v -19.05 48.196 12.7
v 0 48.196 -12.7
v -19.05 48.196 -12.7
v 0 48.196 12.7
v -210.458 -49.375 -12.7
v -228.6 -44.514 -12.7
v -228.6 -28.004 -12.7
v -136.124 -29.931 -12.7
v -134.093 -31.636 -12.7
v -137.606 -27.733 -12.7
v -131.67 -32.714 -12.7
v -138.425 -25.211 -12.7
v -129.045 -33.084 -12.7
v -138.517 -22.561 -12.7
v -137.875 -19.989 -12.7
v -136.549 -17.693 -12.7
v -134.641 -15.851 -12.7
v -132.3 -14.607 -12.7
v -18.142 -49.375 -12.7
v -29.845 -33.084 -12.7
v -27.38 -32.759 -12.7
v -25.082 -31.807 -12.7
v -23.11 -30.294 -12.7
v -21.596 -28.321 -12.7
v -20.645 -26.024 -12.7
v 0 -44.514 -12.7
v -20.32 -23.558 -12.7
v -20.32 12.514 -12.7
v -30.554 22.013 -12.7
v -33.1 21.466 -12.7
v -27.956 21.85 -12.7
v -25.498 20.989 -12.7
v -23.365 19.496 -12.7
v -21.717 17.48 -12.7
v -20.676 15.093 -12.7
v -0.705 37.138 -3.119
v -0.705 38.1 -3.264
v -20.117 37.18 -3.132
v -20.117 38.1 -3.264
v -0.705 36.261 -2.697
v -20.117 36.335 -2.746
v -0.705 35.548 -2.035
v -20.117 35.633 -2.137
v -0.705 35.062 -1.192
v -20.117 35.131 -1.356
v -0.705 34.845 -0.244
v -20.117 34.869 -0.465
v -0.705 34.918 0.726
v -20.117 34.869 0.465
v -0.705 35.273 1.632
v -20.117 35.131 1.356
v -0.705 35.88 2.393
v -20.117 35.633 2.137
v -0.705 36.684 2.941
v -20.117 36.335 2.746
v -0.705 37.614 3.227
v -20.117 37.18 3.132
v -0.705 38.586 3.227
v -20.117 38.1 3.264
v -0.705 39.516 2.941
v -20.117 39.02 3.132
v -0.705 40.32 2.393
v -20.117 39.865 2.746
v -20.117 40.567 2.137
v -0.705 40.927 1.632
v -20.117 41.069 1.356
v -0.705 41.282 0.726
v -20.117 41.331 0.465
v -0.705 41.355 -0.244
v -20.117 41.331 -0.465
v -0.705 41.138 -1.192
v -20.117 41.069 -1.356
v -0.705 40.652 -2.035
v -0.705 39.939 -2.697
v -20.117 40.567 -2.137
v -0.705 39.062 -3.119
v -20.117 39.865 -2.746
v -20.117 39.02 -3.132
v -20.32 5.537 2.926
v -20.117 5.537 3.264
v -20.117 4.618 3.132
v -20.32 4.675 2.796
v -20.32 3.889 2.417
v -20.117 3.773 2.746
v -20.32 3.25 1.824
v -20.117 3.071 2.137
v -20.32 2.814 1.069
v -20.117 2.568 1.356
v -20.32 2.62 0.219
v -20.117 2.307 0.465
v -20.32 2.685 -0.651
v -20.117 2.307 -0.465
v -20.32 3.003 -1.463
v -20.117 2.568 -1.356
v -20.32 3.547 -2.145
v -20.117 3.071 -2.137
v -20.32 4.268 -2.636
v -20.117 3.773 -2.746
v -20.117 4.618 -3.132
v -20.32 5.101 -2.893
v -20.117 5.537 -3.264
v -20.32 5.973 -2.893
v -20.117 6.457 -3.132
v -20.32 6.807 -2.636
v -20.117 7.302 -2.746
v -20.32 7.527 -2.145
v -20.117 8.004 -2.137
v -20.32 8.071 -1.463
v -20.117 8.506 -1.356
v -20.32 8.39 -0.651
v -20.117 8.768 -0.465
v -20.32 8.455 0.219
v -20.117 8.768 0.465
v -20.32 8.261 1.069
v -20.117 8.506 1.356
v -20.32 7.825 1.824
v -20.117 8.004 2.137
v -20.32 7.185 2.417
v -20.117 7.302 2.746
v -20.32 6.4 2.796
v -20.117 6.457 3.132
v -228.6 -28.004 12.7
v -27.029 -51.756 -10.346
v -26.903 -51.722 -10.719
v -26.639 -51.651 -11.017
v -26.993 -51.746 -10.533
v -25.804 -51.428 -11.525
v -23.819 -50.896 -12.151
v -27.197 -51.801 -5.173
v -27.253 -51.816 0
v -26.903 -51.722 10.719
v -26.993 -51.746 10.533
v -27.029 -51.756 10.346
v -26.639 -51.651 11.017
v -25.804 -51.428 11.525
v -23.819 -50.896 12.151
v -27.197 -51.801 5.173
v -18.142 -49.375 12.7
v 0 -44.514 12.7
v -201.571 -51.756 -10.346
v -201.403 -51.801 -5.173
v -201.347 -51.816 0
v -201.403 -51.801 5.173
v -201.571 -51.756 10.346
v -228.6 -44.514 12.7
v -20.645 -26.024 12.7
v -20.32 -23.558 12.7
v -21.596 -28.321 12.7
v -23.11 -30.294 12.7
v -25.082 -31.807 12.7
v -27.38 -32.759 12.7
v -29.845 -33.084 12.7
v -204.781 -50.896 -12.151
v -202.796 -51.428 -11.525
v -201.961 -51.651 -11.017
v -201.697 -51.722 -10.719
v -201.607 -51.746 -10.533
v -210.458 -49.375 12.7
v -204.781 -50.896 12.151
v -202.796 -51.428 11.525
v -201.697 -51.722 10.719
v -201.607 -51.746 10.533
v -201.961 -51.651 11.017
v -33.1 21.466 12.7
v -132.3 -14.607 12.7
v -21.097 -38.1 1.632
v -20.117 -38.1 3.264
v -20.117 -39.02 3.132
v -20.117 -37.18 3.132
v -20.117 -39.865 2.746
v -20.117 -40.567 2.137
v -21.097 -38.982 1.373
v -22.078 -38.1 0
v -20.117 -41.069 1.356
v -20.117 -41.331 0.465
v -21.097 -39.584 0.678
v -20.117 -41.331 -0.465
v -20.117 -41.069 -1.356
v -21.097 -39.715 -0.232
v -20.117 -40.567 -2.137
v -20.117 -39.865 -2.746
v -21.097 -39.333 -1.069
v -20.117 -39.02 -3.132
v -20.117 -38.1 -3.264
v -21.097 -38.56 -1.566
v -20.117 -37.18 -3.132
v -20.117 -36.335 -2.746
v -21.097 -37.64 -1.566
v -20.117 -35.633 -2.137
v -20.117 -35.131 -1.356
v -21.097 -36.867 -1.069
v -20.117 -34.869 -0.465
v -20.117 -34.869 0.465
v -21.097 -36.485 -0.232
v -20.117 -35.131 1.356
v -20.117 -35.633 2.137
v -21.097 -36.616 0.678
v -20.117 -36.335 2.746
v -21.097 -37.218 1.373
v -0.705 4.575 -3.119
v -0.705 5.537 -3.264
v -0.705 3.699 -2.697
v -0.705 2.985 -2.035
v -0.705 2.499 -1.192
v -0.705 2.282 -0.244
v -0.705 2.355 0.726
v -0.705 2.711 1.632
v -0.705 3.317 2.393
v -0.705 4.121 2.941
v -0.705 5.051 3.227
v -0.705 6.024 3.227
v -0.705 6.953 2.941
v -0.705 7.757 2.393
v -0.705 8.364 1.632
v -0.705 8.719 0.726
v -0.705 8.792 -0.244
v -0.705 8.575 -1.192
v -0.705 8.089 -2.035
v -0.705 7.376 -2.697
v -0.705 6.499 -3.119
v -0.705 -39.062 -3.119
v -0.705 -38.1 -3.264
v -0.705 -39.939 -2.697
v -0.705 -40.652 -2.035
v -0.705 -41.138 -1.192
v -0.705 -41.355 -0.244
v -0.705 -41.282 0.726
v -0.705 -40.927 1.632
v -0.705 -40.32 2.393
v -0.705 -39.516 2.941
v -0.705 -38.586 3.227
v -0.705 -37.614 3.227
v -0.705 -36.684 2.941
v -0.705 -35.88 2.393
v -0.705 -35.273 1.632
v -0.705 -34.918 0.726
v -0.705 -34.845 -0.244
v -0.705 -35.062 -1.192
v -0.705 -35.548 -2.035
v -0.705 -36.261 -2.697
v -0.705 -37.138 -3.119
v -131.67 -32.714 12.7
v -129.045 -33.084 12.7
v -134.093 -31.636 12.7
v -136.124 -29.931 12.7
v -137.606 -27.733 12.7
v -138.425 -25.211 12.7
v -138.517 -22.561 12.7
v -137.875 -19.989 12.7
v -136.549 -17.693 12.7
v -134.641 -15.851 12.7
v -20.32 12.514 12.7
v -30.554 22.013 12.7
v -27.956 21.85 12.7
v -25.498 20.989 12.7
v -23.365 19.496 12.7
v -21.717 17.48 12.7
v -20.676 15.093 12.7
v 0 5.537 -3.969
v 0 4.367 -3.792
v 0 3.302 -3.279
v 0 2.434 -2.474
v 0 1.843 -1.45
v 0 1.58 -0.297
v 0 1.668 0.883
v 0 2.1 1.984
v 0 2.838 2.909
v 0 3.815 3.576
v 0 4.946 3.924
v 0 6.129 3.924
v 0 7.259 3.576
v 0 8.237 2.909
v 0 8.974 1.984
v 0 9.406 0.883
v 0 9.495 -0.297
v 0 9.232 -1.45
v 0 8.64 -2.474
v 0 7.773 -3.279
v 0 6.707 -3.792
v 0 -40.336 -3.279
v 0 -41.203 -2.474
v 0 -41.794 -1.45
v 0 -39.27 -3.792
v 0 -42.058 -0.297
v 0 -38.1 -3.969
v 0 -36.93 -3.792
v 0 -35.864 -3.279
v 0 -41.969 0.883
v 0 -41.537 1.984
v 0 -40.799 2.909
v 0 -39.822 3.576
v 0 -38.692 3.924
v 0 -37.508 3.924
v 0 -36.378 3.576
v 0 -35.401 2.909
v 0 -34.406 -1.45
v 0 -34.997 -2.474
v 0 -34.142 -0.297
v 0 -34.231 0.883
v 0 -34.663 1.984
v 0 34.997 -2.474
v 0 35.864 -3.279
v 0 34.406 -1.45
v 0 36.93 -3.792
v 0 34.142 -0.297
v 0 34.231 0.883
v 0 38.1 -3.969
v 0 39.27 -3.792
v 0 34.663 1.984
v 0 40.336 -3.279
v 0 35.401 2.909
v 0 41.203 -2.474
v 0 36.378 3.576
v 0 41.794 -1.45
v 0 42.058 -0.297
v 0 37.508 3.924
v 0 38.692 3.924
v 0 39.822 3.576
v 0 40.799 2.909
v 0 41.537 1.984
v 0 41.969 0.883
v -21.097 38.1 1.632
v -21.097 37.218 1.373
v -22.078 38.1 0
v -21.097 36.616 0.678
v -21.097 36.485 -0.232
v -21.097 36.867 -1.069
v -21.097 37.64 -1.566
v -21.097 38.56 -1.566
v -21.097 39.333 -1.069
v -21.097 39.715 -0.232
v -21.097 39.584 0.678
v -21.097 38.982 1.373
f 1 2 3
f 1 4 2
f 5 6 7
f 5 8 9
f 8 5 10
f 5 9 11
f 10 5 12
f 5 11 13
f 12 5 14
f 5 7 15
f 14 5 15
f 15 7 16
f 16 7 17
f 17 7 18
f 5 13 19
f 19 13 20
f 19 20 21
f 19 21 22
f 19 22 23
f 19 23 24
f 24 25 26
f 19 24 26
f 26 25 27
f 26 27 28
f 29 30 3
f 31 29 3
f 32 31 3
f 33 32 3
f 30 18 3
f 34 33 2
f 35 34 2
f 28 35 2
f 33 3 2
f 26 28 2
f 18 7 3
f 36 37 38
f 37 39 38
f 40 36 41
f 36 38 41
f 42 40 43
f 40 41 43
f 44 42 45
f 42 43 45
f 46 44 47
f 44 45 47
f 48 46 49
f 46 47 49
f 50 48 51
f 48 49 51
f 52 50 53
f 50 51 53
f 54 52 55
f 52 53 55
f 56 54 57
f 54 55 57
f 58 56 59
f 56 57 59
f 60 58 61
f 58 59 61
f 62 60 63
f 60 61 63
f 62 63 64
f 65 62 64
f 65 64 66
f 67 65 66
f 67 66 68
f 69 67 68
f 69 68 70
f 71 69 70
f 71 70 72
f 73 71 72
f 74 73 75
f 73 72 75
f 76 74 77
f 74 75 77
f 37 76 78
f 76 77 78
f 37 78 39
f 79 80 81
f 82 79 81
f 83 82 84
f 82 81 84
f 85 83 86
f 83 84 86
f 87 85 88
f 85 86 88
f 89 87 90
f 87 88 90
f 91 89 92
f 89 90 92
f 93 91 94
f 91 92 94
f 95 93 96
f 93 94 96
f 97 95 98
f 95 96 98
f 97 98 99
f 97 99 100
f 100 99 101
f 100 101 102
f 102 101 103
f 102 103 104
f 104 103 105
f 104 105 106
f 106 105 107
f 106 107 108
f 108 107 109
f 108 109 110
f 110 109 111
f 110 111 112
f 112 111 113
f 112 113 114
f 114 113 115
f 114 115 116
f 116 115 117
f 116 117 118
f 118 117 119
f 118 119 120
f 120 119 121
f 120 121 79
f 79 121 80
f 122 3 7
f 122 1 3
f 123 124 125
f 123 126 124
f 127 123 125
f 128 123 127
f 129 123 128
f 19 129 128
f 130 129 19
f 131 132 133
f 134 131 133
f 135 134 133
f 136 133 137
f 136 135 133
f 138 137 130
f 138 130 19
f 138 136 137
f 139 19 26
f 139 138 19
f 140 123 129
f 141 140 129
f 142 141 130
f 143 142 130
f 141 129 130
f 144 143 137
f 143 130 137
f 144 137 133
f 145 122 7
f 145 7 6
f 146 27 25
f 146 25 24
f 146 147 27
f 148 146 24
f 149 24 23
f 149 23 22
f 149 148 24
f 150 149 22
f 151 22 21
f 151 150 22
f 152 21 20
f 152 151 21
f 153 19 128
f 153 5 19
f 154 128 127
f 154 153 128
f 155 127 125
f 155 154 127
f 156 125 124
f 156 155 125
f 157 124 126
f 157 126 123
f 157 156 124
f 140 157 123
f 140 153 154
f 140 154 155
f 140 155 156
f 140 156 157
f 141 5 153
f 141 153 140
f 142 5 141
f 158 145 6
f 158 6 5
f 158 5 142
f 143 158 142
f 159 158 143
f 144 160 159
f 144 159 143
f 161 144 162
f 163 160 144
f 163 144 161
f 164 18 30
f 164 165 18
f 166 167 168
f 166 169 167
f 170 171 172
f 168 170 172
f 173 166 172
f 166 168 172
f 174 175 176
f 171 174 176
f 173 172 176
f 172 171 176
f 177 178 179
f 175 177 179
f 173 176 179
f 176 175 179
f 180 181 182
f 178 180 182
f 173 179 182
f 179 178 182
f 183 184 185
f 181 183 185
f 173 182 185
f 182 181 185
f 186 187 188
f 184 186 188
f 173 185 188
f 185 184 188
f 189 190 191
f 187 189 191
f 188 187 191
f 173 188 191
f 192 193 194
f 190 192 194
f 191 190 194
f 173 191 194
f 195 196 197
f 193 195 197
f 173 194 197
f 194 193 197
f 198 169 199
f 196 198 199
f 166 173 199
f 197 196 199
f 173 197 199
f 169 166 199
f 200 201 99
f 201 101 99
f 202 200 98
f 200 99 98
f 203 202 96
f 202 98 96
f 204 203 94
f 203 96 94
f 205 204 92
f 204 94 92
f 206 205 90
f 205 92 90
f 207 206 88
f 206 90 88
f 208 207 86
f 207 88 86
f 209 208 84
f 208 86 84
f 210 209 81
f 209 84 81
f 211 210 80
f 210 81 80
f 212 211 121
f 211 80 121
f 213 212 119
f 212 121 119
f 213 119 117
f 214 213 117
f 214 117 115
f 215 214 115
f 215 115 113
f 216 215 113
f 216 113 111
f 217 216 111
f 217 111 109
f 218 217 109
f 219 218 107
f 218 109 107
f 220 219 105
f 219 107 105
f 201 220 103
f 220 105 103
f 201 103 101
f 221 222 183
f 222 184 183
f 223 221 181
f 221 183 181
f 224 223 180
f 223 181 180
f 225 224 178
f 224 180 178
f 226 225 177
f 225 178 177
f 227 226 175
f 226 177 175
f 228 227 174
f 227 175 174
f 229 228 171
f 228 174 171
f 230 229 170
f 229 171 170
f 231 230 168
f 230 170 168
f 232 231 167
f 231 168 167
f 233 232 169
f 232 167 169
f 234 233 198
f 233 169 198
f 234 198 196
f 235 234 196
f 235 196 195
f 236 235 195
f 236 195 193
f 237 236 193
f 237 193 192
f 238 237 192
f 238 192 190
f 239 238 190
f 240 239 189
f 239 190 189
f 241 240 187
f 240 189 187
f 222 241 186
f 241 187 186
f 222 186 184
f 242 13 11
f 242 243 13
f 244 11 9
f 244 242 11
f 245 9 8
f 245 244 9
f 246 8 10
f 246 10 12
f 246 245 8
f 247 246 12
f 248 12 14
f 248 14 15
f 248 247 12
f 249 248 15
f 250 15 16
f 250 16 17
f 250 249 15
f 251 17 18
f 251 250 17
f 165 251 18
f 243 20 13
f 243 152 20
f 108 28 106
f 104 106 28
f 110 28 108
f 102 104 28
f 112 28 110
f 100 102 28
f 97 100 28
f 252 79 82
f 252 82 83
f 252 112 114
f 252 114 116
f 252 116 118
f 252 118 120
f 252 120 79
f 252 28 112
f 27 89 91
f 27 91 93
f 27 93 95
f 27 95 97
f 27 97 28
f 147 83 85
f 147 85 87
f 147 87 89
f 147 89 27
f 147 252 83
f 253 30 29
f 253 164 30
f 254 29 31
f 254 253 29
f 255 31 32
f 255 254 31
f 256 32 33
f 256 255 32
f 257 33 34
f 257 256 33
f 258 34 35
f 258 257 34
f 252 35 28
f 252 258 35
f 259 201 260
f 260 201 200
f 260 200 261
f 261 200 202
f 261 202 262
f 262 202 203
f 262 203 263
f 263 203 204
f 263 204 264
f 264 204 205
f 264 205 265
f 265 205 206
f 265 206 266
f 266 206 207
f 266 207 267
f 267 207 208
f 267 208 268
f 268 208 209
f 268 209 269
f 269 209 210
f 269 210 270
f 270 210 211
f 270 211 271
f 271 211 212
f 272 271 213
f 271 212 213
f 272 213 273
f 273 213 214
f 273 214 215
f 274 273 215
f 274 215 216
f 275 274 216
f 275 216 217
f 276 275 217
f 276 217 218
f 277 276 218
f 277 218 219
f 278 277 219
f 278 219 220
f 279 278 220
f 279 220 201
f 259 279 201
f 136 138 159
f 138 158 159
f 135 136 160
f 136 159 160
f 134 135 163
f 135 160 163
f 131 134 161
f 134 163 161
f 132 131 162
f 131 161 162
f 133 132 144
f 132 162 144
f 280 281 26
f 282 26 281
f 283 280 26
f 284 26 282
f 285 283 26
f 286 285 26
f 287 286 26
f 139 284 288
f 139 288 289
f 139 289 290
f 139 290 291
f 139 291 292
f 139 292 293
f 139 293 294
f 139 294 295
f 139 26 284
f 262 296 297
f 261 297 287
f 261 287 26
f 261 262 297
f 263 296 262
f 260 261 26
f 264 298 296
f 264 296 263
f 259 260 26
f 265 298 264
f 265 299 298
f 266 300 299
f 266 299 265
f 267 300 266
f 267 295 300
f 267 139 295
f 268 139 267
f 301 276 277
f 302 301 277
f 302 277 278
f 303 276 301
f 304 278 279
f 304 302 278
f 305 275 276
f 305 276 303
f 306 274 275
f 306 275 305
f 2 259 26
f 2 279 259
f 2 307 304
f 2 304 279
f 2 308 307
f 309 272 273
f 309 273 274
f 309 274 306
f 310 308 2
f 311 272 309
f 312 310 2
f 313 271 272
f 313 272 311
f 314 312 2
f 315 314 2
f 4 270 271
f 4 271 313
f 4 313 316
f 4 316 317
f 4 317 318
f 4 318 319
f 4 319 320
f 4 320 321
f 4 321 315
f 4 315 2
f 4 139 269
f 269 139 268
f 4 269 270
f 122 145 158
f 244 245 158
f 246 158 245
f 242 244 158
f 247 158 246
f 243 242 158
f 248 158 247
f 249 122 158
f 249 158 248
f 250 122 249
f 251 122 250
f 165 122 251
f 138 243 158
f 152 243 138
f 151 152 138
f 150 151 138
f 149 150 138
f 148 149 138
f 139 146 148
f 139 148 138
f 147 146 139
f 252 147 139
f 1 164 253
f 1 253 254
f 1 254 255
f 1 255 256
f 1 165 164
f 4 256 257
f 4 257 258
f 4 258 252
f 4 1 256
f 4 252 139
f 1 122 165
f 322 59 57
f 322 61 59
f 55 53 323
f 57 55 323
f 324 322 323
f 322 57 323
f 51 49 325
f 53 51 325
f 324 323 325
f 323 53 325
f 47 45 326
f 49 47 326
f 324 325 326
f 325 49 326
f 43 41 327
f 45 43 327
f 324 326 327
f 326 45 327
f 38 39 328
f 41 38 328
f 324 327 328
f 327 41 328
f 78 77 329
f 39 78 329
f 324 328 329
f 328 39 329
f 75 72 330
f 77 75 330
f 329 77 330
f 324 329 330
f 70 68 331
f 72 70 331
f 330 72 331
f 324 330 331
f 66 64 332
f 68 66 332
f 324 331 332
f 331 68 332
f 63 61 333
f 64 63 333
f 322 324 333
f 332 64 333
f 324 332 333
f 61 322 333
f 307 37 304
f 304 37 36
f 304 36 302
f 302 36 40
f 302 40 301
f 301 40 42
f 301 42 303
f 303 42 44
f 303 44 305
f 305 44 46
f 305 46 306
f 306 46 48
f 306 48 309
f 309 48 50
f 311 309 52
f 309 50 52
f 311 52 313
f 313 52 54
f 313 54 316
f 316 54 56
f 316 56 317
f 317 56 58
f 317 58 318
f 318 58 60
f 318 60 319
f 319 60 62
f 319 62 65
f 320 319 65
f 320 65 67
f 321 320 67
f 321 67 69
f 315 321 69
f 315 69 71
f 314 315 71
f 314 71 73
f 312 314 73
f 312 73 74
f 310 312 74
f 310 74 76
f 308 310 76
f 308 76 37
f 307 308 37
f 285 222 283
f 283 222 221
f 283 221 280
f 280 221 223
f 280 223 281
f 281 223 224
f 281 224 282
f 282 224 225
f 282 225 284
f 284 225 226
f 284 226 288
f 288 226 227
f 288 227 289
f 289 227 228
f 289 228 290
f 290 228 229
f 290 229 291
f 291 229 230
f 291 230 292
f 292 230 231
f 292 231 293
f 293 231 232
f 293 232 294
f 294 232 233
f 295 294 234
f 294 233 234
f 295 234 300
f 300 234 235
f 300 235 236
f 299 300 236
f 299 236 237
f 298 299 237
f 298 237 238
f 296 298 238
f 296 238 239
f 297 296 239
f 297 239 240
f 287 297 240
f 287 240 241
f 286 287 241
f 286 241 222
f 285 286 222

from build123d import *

# Parameters (mm, degrees)
BOSS_EXTRUDE1_DEPTH                = 12.7
F_5_16_18_TAPPED_HOLE1_D           = 6.5278
F_5_16_18_TAPPED_HOLE1_DEPTH       = 20.1168
F_5_16_18_TAPPED_HOLE1_CSINK_D     = 7.9375
F_5_16_18_TAPPED_HOLE1_CSINK_ANGLE = 90
F_5_16_18_TAPPED_HOLE1_TIP         = 1.961148974
SKETCH8_OUTSIDE_W                  = 77.69
SKETCH8_OUTSIDE_H                  = 153.891
CUT_EXTRUDE1_DEPTH                 = 229.6
FILLET1_R                          = 2.38125


with BuildPart() as part:
    # Sketch1 w/mock PCB → Boss-Extrude1 (new body, symmetric)
    with BuildSketch(Plane.XY):
        Polygon((-19.05, 48.1965), (-228.6, -28.0035), (-228.6, -44.5135), (-195.422068321, -53.4035), (-33.177931679, -53.4035), (0, -44.5135), (0, 48.1965), align=None)
        with BuildLine():
            Line((-20.32, 12.51406647), (-20.32, -23.5585))
            ThreePointArc((-20.32, -23.5585), (-23.109807909, -30.293692091), (-29.845, -33.0835))
            Line((-29.845, -33.0835), (-129.044557791, -33.0835))
            ThreePointArc((-129.044557791, -33.0835), (-138.425095375, -25.211115999), (-132.299660467, -14.606967641))
            Line((-132.299660467, -14.606967641), (-33.100102676, 21.465598828))
            ThreePointArc((-33.100102676, 21.465598828), (-24.380534243, 20.315684186), (-20.32, 12.51406647))
        make_face(mode=Mode.SUBTRACT)
    extrude(amount=BOSS_EXTRUDE1_DEPTH, both=True)

    # 5/16-18 Tapped Hole1
    with Locations(Plane(origin=(0, 31.393459191, 0.765177918), x_dir=(0, 0, 1), z_dir=(1, 0, 0))):
        with Locations((-0.765177918, 69.493459191), (-0.765177918, 25.856259191), (-0.765177918, -6.706540809)):
            CounterSinkHole(F_5_16_18_TAPPED_HOLE1_D / 2, F_5_16_18_TAPPED_HOLE1_CSINK_D / 2, depth=F_5_16_18_TAPPED_HOLE1_DEPTH, counter_sink_angle=F_5_16_18_TAPPED_HOLE1_CSINK_ANGLE)
            with Locations((0, 0, -(F_5_16_18_TAPPED_HOLE1_DEPTH + F_5_16_18_TAPPED_HOLE1_TIP / 2))):  # 118° drill point
                Cone(0, F_5_16_18_TAPPED_HOLE1_D / 2, F_5_16_18_TAPPED_HOLE1_TIP, mode=Mode.SUBTRACT)

    # Sketch8 outside → Cut-Extrude1 (cut, through all)
    with BuildSketch(Plane(origin=(0, 0, 0), x_dir=(0, 0, -1), z_dir=(1, 0, 0))):
        with Locations((0, -2.6035)):
            Rectangle(SKETCH8_OUTSIDE_W, SKETCH8_OUTSIDE_H)
        with BuildLine():
            Line((12.7, 48.1965), (12.7, -51.725281086))
            ThreePointArc((12.7, -51.725281086), (0, -51.816), (-12.7, -51.725281086))
            Line((-12.7, -51.725281086), (-12.7, 48.1965))
            Line((-12.7, 48.1965), (12.7, 48.1965))
        make_face(mode=Mode.SUBTRACT)
    extrude(amount=-CUT_EXTRUDE1_DEPTH, mode=Mode.SUBTRACT)

    # Fillet1
    fillet1_edges = [part.edges().sort_by_distance(p)[0] for p in [
        (-114.3, -51.725281086, -12.7),
        (-114.3, -51.725281086, 12.7),
    ]]
    fillet(fillet1_edges, radius=FILLET1_R)


solid = part.part
